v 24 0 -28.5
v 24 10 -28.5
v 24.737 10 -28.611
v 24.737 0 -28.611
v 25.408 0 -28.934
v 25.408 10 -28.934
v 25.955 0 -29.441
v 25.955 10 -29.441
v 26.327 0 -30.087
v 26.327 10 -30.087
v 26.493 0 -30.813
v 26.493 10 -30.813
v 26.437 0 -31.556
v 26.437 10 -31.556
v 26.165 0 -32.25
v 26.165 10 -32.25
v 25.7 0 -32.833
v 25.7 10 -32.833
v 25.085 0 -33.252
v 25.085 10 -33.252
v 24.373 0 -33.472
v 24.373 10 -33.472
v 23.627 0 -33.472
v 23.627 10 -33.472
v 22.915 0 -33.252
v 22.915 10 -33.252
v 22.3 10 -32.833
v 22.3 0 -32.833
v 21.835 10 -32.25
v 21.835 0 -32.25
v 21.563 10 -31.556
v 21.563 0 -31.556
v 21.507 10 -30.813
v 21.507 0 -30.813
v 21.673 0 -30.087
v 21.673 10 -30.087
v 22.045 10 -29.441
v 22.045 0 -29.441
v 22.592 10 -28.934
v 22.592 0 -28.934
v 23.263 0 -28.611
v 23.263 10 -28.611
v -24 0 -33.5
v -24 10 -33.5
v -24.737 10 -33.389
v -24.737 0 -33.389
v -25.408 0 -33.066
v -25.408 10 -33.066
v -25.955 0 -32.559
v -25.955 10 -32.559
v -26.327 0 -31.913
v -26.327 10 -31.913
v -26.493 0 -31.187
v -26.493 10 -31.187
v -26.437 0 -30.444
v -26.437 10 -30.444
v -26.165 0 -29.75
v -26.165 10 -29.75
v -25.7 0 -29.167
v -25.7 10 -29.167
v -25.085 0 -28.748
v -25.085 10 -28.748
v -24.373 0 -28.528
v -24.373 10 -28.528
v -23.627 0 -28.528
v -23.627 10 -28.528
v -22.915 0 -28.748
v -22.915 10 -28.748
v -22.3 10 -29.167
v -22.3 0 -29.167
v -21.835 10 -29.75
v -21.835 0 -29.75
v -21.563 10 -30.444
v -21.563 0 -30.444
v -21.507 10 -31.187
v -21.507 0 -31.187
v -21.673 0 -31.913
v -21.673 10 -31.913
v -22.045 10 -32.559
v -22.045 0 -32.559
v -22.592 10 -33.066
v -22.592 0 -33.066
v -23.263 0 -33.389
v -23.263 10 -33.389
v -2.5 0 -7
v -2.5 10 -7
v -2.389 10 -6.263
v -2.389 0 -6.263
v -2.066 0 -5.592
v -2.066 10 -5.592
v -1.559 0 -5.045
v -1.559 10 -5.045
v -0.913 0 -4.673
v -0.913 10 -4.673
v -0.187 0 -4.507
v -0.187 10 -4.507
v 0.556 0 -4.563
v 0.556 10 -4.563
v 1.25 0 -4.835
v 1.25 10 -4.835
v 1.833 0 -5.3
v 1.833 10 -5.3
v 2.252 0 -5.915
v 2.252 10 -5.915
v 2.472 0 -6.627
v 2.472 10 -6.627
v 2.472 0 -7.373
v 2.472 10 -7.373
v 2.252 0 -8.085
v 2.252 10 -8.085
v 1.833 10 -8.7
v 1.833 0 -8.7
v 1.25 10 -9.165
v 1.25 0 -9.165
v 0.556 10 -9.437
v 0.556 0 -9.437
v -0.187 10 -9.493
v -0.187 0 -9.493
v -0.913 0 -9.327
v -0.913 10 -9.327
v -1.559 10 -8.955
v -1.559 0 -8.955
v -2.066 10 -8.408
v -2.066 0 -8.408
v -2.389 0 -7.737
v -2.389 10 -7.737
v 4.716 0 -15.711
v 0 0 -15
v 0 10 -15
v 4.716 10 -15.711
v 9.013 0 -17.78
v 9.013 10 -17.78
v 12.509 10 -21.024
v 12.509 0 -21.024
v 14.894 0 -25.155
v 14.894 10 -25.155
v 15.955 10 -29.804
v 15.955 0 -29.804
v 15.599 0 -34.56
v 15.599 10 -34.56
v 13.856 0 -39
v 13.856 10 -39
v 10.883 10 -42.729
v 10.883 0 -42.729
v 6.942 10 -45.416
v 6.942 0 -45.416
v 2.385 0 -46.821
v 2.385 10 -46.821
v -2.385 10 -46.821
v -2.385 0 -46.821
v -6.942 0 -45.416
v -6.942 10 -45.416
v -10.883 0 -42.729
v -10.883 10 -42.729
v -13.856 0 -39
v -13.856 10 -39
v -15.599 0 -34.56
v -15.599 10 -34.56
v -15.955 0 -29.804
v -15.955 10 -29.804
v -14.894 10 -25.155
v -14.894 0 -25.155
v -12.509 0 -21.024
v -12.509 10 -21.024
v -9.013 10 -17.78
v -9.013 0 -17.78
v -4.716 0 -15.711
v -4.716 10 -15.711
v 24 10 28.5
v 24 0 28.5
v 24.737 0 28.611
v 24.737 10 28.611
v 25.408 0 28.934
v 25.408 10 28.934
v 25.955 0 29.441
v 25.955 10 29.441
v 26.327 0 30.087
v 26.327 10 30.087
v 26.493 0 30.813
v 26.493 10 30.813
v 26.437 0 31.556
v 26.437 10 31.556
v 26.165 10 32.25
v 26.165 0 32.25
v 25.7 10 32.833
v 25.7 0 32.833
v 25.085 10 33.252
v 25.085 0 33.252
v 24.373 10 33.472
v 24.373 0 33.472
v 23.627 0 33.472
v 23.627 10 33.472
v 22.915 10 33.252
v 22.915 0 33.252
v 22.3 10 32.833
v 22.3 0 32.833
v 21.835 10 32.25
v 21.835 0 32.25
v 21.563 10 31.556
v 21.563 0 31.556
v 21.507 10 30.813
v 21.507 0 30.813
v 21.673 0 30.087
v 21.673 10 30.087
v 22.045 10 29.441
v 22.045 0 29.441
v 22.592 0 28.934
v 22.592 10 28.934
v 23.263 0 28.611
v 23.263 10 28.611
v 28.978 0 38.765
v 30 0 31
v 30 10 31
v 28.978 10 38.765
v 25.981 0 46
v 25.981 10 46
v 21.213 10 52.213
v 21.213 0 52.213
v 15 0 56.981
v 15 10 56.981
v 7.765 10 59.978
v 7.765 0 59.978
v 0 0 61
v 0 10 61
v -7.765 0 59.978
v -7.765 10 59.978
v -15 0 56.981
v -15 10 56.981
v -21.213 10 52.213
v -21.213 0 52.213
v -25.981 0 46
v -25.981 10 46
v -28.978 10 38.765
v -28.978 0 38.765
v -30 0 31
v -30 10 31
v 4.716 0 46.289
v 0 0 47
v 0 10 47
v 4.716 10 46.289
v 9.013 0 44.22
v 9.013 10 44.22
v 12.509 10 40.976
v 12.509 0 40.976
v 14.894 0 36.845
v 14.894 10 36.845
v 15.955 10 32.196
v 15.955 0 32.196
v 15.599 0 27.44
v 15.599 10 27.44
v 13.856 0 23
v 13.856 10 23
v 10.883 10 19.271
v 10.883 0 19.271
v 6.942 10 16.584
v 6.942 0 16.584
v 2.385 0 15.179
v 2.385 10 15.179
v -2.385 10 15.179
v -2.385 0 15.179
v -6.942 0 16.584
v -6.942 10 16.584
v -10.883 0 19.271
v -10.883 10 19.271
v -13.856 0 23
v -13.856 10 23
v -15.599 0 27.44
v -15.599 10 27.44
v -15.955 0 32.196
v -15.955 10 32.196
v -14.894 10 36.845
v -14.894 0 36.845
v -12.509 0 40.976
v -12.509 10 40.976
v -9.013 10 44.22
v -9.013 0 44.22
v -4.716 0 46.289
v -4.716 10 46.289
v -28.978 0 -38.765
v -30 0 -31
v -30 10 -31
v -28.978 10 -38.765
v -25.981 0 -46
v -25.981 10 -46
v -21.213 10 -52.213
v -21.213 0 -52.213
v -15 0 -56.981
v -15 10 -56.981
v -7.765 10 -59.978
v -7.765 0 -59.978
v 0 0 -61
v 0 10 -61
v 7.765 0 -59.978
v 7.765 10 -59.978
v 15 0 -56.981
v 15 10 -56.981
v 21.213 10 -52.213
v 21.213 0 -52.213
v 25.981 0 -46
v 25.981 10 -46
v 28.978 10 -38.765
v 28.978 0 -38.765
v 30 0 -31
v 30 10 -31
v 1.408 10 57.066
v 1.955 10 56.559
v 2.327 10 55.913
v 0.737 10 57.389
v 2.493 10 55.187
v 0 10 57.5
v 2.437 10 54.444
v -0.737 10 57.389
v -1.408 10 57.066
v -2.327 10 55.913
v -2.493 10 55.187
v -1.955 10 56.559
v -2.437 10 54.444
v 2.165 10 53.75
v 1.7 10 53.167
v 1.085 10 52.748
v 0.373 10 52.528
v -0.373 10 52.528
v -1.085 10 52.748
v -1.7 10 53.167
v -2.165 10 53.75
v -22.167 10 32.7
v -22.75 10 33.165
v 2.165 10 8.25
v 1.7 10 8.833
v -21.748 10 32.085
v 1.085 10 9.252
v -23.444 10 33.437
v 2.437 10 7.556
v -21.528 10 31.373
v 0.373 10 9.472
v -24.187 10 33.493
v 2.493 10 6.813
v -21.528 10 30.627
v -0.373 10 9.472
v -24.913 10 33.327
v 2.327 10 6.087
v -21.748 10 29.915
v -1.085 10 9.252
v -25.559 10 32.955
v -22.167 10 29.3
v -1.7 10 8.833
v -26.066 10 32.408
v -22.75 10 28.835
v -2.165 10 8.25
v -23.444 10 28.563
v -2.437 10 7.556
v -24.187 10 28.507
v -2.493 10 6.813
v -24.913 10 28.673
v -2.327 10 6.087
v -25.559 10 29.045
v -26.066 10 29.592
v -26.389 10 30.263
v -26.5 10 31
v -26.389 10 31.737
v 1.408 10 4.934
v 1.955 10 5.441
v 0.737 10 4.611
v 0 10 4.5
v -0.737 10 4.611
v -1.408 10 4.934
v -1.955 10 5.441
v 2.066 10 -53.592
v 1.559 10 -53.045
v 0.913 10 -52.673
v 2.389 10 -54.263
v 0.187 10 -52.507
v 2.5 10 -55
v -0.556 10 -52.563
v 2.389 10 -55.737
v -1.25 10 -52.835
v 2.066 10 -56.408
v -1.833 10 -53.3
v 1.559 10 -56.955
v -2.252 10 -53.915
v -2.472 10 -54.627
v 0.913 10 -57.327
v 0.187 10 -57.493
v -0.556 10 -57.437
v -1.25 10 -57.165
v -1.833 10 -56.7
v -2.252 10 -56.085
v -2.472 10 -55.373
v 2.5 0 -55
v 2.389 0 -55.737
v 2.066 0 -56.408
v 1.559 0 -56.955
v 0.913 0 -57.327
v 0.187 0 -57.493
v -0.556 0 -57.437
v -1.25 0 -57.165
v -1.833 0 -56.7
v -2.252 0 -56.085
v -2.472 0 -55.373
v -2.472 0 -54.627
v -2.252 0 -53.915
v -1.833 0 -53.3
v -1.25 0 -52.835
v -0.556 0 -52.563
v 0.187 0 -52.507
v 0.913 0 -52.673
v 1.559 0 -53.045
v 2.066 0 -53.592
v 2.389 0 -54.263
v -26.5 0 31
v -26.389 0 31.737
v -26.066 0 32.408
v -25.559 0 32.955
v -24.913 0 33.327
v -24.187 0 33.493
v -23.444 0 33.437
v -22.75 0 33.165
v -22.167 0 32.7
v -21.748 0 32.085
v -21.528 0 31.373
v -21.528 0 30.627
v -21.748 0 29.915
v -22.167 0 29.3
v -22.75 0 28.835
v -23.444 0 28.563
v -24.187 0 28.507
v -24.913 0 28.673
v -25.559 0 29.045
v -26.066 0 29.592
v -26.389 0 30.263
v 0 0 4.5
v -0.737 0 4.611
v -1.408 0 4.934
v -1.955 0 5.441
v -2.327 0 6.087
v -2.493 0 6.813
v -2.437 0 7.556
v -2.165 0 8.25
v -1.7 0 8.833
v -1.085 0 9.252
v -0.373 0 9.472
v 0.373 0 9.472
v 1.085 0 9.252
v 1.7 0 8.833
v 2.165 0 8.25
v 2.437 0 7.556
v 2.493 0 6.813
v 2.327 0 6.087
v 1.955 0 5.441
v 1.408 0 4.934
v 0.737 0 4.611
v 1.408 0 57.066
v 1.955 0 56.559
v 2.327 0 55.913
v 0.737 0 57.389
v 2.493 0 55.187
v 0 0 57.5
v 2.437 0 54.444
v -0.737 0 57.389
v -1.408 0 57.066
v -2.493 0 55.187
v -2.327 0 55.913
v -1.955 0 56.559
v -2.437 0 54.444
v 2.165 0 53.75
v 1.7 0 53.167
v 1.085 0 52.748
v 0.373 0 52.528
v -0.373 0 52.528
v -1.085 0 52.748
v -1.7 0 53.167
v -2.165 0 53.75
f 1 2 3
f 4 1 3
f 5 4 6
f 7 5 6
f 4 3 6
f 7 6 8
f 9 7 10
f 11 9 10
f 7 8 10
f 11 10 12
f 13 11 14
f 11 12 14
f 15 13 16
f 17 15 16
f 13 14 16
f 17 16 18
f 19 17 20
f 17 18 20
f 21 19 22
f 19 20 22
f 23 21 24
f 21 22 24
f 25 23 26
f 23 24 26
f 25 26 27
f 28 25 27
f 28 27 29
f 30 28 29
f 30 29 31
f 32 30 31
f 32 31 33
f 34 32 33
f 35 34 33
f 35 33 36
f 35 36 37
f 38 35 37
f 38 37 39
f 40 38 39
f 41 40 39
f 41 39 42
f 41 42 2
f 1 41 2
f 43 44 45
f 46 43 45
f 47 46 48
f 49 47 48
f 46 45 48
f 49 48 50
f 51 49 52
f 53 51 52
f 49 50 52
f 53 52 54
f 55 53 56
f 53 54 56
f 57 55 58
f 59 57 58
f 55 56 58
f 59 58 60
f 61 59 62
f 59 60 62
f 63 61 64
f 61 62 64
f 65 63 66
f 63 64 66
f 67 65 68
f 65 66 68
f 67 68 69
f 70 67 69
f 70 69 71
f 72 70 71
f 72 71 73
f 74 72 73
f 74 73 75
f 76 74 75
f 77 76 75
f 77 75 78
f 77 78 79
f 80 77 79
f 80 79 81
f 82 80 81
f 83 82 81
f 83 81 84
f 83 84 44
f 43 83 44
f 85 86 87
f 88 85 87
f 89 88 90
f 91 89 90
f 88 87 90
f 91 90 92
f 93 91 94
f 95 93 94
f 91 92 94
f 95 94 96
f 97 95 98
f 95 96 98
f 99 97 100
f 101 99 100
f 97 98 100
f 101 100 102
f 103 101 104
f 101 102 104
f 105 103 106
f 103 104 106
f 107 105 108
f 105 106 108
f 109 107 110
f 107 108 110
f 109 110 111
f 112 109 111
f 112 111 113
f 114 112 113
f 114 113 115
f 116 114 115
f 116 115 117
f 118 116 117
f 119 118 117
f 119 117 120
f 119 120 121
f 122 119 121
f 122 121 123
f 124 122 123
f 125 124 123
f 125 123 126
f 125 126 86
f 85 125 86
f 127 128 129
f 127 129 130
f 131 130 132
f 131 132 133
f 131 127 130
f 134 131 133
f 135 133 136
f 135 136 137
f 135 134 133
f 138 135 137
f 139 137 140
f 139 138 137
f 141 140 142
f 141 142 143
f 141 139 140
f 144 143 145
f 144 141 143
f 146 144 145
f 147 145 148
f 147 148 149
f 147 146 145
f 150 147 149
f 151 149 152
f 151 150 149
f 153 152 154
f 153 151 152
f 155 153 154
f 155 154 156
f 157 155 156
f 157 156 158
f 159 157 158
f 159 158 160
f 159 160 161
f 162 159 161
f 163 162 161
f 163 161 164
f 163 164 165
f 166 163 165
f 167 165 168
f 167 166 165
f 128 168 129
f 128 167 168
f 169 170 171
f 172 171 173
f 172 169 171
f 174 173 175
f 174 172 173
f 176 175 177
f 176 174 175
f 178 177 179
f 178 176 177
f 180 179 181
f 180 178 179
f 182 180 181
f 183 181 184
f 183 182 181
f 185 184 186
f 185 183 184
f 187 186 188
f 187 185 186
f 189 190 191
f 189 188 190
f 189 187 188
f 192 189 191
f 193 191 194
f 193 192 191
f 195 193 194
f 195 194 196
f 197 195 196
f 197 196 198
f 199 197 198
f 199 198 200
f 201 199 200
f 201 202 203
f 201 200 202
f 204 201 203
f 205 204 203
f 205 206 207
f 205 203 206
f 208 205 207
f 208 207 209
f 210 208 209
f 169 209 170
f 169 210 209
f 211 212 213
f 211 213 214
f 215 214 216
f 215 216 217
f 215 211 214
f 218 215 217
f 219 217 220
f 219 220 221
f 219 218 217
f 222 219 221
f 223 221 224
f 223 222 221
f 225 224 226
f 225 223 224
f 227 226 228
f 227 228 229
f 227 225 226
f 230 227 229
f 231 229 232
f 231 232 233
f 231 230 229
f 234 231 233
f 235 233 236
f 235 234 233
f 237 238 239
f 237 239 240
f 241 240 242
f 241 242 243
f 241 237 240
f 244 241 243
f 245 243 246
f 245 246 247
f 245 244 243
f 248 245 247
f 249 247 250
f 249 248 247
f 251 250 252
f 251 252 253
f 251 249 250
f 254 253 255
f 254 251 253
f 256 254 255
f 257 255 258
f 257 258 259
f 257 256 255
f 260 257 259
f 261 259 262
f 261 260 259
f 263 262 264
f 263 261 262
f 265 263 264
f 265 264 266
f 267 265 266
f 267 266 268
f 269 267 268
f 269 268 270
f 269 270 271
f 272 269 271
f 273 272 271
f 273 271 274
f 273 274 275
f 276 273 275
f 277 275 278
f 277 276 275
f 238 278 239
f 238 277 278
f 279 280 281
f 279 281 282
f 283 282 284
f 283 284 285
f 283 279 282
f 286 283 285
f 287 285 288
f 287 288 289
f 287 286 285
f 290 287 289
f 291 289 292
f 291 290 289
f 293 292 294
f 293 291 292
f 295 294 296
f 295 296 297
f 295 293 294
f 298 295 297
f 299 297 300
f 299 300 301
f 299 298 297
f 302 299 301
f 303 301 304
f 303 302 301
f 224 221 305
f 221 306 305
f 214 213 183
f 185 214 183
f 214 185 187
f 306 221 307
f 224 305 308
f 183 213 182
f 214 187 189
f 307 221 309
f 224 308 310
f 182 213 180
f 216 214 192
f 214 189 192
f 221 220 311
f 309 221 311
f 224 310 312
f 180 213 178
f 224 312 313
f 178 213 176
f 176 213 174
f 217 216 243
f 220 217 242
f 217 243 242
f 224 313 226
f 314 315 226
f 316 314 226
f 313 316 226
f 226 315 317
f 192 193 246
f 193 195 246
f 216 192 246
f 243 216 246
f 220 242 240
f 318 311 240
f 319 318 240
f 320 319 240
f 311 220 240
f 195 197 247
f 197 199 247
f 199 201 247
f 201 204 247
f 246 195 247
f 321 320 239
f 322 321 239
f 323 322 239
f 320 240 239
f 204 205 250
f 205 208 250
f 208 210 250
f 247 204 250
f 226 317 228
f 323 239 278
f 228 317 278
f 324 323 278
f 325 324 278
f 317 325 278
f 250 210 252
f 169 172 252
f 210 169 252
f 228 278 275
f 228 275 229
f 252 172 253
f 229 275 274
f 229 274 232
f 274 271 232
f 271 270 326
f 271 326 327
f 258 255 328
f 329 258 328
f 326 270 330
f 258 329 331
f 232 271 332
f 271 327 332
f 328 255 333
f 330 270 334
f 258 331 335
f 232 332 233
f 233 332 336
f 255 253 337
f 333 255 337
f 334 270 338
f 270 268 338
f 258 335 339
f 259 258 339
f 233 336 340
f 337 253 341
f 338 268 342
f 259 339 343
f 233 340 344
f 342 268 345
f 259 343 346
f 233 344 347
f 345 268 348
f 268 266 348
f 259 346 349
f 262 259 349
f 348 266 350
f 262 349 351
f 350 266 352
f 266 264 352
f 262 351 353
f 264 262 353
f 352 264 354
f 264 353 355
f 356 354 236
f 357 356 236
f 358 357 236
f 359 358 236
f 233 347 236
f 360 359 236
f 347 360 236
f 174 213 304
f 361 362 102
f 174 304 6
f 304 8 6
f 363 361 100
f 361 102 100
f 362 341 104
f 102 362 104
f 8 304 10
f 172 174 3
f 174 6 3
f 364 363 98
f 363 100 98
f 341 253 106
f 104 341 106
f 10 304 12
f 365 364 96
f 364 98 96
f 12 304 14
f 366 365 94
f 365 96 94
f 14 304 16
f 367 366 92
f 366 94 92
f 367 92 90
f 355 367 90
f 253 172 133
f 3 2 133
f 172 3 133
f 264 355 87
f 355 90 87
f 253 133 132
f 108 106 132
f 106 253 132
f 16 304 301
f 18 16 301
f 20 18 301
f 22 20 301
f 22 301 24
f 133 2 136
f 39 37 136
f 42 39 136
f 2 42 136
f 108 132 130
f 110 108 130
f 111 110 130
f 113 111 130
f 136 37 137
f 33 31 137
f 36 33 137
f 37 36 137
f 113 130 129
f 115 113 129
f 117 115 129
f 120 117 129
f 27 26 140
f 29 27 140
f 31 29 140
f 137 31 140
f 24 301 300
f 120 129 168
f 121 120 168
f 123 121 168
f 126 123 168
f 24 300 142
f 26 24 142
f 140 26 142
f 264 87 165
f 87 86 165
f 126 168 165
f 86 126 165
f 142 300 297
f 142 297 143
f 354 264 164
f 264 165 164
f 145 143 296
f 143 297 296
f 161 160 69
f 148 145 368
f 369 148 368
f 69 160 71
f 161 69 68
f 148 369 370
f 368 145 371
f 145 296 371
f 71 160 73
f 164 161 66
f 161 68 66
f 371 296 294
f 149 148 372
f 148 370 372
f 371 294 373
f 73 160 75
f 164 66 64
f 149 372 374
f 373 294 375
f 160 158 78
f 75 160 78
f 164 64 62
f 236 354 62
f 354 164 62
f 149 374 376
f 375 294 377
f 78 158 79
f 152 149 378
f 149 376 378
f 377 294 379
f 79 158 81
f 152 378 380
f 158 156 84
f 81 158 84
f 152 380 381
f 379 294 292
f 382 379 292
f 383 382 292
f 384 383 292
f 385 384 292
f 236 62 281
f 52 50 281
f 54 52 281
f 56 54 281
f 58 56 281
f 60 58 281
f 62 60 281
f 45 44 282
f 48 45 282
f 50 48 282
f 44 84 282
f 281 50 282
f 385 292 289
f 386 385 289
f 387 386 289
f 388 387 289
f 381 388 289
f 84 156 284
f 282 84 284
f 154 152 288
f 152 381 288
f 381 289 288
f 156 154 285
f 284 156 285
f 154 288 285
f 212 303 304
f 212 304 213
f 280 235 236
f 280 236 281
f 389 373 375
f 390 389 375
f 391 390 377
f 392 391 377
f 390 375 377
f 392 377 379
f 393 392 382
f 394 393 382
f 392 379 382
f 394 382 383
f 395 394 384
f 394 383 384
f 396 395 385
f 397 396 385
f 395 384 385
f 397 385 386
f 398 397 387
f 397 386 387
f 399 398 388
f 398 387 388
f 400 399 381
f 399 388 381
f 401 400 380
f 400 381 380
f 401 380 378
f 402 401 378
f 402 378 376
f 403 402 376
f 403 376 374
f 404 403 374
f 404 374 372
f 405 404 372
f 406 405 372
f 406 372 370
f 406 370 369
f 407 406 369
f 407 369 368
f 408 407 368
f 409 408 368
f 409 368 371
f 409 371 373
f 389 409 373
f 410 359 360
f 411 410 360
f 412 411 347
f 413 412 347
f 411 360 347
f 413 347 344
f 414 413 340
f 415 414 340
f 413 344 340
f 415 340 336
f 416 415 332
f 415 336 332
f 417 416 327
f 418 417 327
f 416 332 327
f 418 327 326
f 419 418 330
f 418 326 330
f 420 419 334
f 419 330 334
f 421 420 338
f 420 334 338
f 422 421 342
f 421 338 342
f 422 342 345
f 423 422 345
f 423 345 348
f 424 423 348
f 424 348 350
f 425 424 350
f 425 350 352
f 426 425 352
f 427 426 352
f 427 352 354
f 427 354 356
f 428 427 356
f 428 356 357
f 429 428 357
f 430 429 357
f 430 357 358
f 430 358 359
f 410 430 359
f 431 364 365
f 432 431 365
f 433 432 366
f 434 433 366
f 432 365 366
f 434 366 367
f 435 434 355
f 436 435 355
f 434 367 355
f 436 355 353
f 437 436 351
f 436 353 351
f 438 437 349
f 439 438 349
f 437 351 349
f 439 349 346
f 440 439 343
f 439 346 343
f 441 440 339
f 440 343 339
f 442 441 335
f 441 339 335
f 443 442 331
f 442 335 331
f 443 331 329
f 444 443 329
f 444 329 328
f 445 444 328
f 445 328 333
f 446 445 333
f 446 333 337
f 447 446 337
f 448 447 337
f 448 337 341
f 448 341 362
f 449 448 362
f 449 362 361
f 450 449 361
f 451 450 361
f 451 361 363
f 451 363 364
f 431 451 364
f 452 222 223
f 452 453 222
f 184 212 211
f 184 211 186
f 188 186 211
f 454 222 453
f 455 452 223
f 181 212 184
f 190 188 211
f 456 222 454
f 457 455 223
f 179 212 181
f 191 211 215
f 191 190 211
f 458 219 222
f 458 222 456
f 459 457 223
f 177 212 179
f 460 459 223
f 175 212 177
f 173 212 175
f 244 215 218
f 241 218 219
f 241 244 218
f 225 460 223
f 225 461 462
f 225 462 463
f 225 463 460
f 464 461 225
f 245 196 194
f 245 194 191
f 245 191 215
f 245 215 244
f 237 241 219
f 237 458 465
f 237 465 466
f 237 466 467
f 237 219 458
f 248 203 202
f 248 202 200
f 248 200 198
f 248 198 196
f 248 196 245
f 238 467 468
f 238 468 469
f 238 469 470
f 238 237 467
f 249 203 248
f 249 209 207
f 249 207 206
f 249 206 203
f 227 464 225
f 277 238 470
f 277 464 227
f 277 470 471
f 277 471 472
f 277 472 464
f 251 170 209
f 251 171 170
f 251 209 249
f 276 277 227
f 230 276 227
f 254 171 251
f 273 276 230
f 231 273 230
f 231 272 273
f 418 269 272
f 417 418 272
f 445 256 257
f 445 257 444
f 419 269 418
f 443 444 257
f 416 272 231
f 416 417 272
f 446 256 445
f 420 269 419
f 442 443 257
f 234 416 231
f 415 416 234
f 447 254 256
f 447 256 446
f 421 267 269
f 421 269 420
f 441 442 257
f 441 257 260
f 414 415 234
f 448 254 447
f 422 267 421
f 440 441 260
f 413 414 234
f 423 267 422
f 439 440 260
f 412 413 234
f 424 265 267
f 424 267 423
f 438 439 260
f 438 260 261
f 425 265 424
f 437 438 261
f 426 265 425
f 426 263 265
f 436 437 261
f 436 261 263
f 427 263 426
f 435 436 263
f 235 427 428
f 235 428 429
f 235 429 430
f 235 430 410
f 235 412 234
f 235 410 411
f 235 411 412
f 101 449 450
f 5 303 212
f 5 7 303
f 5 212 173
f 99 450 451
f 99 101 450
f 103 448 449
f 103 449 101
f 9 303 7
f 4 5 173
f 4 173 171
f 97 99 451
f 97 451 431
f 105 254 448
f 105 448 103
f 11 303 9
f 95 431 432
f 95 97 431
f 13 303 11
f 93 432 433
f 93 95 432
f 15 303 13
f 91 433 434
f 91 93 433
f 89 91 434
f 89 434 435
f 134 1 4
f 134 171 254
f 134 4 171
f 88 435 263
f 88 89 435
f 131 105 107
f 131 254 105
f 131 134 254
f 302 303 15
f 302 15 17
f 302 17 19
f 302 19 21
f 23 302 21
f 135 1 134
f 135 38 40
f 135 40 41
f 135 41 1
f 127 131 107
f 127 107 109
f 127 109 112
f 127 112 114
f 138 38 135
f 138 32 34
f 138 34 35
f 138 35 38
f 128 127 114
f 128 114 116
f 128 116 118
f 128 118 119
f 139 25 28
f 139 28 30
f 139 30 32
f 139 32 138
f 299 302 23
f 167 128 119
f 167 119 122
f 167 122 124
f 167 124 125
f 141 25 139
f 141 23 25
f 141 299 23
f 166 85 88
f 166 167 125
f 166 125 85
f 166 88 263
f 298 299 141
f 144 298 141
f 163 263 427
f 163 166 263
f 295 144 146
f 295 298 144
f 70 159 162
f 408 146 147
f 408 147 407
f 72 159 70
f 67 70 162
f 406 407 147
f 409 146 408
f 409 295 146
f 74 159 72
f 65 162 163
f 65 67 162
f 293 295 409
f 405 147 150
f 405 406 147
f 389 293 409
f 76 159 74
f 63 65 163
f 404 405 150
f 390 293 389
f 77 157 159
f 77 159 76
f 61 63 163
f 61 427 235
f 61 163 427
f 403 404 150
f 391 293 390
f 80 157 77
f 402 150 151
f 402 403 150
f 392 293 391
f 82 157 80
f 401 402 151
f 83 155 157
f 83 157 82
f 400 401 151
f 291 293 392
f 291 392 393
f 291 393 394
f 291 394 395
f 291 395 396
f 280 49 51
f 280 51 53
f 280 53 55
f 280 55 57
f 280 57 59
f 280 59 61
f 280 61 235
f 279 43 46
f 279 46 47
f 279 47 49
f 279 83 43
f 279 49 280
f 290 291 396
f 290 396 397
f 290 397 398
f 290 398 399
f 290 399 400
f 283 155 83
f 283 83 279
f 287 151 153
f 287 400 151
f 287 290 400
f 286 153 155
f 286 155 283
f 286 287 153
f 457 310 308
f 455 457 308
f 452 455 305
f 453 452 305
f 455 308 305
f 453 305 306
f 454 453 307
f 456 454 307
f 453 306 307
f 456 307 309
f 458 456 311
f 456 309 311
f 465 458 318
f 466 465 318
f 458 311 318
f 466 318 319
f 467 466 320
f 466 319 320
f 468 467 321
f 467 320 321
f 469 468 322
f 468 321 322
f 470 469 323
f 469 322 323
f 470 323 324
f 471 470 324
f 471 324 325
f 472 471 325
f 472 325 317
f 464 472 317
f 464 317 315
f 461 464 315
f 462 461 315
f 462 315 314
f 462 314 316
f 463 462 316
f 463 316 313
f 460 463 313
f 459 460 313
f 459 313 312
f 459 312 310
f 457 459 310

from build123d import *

# Parameters (mm, degrees)
CROQUIS1_R              = 16
SALIENTE_EXTRUIR1_DEPTH = 10
SKETCH1_R               = 2.5
CUT_EXTRUDE1_DEPTH      = 69.709533545
CIRPATTERN1_COUNT       = 4
MIRROR1_COPY_1_SKETCH_R = 2.5
MIRROR1_COPY_1_DEPTH    = 69.709533545
MIRROR1_COPY_2_SKETCH_R = 2.5
MIRROR1_COPY_2_DEPTH    = 69.709533545
MIRROR1_COPY_3_SKETCH_R = 2.5
MIRROR1_COPY_3_DEPTH    = 69.709533545


with BuildPart() as part:
    # Croquis1 → Saliente-Extruir1 (new body)
    with BuildSketch(Plane(origin=(0, 0, 0), x_dir=(1, 0, 0), z_dir=(0, 1, 0))):
        with BuildLine():
            Line((30, 31), (30, -31))
            ThreePointArc((30, -31), (0, -61), (-30, -31))
            Line((-30, -31), (-30, 31))
            ThreePointArc((-30, 31), (0, 61), (30, 31))
        make_face()
        with Locations(Location((0, -31, 0), (0, 0, 270))):
            Circle(CROQUIS1_R, mode=Mode.SUBTRACT)
        with Locations(Location((0, 31, 0), (0, 0, 270))):
            Circle(CROQUIS1_R, mode=Mode.SUBTRACT)
    extrude(amount=SALIENTE_EXTRUIR1_DEPTH)

    # Sketch1 → Cut-Extrude1 (cut, through all)
    with BuildSketch(Plane(origin=(0, 10, 0), x_dir=(1, 0, 0), z_dir=(0, 1, 0))):
        with Locations(Location((24, 31, 0), (0, 0, 270))):
            Circle(SKETCH1_R)
    cut_extrude1 = extrude(amount=-CUT_EXTRUDE1_DEPTH, mode=Mode.SUBTRACT)

    # CirPattern1: Cut-Extrude1 ×4 about axis
    cirpattern1_axis = Axis((0, 0, -31), (0, 1, 0))
    for i in range(1, CIRPATTERN1_COUNT):
        add(cut_extrude1.rotate(cirpattern1_axis, i * 360 / CIRPATTERN1_COUNT), mode=Mode.SUBTRACT)

    # Mirror1: Cut-Extrude1 across plane
    add(cut_extrude1.mirror(Plane.XY), mode=Mode.SUBTRACT)

    # Mirror1 copy 1 sketch → Mirror1 copy 1 (cut, through all)
    with BuildSketch(Plane(origin=(31, 10, 31), x_dir=(0, 0, 1), z_dir=(0, 1, 0))):
        with Locations((24, -31)):
            Circle(MIRROR1_COPY_1_SKETCH_R)
    extrude(amount=-MIRROR1_COPY_1_DEPTH, mode=Mode.SUBTRACT)

    # Mirror1 copy 2 sketch → Mirror1 copy 2 (cut, through all)
    with BuildSketch(Plane(origin=(0, 10, 62), x_dir=(-1, 0, 0), z_dir=(0, 1, 0))):
        with Locations((24, -31)):
            Circle(MIRROR1_COPY_2_SKETCH_R)
    extrude(amount=-MIRROR1_COPY_2_DEPTH, mode=Mode.SUBTRACT)

    # Mirror1 copy 3 sketch → Mirror1 copy 3 (cut, through all)
    with BuildSketch(Plane(origin=(-31, 10, 31), x_dir=(0, 0, -1), z_dir=(0, 1, 0))):
        with Locations((24, -31)):
            Circle(MIRROR1_COPY_3_SKETCH_R)
    extrude(amount=-MIRROR1_COPY_3_DEPTH, mode=Mode.SUBTRACT)


solid = part.part
